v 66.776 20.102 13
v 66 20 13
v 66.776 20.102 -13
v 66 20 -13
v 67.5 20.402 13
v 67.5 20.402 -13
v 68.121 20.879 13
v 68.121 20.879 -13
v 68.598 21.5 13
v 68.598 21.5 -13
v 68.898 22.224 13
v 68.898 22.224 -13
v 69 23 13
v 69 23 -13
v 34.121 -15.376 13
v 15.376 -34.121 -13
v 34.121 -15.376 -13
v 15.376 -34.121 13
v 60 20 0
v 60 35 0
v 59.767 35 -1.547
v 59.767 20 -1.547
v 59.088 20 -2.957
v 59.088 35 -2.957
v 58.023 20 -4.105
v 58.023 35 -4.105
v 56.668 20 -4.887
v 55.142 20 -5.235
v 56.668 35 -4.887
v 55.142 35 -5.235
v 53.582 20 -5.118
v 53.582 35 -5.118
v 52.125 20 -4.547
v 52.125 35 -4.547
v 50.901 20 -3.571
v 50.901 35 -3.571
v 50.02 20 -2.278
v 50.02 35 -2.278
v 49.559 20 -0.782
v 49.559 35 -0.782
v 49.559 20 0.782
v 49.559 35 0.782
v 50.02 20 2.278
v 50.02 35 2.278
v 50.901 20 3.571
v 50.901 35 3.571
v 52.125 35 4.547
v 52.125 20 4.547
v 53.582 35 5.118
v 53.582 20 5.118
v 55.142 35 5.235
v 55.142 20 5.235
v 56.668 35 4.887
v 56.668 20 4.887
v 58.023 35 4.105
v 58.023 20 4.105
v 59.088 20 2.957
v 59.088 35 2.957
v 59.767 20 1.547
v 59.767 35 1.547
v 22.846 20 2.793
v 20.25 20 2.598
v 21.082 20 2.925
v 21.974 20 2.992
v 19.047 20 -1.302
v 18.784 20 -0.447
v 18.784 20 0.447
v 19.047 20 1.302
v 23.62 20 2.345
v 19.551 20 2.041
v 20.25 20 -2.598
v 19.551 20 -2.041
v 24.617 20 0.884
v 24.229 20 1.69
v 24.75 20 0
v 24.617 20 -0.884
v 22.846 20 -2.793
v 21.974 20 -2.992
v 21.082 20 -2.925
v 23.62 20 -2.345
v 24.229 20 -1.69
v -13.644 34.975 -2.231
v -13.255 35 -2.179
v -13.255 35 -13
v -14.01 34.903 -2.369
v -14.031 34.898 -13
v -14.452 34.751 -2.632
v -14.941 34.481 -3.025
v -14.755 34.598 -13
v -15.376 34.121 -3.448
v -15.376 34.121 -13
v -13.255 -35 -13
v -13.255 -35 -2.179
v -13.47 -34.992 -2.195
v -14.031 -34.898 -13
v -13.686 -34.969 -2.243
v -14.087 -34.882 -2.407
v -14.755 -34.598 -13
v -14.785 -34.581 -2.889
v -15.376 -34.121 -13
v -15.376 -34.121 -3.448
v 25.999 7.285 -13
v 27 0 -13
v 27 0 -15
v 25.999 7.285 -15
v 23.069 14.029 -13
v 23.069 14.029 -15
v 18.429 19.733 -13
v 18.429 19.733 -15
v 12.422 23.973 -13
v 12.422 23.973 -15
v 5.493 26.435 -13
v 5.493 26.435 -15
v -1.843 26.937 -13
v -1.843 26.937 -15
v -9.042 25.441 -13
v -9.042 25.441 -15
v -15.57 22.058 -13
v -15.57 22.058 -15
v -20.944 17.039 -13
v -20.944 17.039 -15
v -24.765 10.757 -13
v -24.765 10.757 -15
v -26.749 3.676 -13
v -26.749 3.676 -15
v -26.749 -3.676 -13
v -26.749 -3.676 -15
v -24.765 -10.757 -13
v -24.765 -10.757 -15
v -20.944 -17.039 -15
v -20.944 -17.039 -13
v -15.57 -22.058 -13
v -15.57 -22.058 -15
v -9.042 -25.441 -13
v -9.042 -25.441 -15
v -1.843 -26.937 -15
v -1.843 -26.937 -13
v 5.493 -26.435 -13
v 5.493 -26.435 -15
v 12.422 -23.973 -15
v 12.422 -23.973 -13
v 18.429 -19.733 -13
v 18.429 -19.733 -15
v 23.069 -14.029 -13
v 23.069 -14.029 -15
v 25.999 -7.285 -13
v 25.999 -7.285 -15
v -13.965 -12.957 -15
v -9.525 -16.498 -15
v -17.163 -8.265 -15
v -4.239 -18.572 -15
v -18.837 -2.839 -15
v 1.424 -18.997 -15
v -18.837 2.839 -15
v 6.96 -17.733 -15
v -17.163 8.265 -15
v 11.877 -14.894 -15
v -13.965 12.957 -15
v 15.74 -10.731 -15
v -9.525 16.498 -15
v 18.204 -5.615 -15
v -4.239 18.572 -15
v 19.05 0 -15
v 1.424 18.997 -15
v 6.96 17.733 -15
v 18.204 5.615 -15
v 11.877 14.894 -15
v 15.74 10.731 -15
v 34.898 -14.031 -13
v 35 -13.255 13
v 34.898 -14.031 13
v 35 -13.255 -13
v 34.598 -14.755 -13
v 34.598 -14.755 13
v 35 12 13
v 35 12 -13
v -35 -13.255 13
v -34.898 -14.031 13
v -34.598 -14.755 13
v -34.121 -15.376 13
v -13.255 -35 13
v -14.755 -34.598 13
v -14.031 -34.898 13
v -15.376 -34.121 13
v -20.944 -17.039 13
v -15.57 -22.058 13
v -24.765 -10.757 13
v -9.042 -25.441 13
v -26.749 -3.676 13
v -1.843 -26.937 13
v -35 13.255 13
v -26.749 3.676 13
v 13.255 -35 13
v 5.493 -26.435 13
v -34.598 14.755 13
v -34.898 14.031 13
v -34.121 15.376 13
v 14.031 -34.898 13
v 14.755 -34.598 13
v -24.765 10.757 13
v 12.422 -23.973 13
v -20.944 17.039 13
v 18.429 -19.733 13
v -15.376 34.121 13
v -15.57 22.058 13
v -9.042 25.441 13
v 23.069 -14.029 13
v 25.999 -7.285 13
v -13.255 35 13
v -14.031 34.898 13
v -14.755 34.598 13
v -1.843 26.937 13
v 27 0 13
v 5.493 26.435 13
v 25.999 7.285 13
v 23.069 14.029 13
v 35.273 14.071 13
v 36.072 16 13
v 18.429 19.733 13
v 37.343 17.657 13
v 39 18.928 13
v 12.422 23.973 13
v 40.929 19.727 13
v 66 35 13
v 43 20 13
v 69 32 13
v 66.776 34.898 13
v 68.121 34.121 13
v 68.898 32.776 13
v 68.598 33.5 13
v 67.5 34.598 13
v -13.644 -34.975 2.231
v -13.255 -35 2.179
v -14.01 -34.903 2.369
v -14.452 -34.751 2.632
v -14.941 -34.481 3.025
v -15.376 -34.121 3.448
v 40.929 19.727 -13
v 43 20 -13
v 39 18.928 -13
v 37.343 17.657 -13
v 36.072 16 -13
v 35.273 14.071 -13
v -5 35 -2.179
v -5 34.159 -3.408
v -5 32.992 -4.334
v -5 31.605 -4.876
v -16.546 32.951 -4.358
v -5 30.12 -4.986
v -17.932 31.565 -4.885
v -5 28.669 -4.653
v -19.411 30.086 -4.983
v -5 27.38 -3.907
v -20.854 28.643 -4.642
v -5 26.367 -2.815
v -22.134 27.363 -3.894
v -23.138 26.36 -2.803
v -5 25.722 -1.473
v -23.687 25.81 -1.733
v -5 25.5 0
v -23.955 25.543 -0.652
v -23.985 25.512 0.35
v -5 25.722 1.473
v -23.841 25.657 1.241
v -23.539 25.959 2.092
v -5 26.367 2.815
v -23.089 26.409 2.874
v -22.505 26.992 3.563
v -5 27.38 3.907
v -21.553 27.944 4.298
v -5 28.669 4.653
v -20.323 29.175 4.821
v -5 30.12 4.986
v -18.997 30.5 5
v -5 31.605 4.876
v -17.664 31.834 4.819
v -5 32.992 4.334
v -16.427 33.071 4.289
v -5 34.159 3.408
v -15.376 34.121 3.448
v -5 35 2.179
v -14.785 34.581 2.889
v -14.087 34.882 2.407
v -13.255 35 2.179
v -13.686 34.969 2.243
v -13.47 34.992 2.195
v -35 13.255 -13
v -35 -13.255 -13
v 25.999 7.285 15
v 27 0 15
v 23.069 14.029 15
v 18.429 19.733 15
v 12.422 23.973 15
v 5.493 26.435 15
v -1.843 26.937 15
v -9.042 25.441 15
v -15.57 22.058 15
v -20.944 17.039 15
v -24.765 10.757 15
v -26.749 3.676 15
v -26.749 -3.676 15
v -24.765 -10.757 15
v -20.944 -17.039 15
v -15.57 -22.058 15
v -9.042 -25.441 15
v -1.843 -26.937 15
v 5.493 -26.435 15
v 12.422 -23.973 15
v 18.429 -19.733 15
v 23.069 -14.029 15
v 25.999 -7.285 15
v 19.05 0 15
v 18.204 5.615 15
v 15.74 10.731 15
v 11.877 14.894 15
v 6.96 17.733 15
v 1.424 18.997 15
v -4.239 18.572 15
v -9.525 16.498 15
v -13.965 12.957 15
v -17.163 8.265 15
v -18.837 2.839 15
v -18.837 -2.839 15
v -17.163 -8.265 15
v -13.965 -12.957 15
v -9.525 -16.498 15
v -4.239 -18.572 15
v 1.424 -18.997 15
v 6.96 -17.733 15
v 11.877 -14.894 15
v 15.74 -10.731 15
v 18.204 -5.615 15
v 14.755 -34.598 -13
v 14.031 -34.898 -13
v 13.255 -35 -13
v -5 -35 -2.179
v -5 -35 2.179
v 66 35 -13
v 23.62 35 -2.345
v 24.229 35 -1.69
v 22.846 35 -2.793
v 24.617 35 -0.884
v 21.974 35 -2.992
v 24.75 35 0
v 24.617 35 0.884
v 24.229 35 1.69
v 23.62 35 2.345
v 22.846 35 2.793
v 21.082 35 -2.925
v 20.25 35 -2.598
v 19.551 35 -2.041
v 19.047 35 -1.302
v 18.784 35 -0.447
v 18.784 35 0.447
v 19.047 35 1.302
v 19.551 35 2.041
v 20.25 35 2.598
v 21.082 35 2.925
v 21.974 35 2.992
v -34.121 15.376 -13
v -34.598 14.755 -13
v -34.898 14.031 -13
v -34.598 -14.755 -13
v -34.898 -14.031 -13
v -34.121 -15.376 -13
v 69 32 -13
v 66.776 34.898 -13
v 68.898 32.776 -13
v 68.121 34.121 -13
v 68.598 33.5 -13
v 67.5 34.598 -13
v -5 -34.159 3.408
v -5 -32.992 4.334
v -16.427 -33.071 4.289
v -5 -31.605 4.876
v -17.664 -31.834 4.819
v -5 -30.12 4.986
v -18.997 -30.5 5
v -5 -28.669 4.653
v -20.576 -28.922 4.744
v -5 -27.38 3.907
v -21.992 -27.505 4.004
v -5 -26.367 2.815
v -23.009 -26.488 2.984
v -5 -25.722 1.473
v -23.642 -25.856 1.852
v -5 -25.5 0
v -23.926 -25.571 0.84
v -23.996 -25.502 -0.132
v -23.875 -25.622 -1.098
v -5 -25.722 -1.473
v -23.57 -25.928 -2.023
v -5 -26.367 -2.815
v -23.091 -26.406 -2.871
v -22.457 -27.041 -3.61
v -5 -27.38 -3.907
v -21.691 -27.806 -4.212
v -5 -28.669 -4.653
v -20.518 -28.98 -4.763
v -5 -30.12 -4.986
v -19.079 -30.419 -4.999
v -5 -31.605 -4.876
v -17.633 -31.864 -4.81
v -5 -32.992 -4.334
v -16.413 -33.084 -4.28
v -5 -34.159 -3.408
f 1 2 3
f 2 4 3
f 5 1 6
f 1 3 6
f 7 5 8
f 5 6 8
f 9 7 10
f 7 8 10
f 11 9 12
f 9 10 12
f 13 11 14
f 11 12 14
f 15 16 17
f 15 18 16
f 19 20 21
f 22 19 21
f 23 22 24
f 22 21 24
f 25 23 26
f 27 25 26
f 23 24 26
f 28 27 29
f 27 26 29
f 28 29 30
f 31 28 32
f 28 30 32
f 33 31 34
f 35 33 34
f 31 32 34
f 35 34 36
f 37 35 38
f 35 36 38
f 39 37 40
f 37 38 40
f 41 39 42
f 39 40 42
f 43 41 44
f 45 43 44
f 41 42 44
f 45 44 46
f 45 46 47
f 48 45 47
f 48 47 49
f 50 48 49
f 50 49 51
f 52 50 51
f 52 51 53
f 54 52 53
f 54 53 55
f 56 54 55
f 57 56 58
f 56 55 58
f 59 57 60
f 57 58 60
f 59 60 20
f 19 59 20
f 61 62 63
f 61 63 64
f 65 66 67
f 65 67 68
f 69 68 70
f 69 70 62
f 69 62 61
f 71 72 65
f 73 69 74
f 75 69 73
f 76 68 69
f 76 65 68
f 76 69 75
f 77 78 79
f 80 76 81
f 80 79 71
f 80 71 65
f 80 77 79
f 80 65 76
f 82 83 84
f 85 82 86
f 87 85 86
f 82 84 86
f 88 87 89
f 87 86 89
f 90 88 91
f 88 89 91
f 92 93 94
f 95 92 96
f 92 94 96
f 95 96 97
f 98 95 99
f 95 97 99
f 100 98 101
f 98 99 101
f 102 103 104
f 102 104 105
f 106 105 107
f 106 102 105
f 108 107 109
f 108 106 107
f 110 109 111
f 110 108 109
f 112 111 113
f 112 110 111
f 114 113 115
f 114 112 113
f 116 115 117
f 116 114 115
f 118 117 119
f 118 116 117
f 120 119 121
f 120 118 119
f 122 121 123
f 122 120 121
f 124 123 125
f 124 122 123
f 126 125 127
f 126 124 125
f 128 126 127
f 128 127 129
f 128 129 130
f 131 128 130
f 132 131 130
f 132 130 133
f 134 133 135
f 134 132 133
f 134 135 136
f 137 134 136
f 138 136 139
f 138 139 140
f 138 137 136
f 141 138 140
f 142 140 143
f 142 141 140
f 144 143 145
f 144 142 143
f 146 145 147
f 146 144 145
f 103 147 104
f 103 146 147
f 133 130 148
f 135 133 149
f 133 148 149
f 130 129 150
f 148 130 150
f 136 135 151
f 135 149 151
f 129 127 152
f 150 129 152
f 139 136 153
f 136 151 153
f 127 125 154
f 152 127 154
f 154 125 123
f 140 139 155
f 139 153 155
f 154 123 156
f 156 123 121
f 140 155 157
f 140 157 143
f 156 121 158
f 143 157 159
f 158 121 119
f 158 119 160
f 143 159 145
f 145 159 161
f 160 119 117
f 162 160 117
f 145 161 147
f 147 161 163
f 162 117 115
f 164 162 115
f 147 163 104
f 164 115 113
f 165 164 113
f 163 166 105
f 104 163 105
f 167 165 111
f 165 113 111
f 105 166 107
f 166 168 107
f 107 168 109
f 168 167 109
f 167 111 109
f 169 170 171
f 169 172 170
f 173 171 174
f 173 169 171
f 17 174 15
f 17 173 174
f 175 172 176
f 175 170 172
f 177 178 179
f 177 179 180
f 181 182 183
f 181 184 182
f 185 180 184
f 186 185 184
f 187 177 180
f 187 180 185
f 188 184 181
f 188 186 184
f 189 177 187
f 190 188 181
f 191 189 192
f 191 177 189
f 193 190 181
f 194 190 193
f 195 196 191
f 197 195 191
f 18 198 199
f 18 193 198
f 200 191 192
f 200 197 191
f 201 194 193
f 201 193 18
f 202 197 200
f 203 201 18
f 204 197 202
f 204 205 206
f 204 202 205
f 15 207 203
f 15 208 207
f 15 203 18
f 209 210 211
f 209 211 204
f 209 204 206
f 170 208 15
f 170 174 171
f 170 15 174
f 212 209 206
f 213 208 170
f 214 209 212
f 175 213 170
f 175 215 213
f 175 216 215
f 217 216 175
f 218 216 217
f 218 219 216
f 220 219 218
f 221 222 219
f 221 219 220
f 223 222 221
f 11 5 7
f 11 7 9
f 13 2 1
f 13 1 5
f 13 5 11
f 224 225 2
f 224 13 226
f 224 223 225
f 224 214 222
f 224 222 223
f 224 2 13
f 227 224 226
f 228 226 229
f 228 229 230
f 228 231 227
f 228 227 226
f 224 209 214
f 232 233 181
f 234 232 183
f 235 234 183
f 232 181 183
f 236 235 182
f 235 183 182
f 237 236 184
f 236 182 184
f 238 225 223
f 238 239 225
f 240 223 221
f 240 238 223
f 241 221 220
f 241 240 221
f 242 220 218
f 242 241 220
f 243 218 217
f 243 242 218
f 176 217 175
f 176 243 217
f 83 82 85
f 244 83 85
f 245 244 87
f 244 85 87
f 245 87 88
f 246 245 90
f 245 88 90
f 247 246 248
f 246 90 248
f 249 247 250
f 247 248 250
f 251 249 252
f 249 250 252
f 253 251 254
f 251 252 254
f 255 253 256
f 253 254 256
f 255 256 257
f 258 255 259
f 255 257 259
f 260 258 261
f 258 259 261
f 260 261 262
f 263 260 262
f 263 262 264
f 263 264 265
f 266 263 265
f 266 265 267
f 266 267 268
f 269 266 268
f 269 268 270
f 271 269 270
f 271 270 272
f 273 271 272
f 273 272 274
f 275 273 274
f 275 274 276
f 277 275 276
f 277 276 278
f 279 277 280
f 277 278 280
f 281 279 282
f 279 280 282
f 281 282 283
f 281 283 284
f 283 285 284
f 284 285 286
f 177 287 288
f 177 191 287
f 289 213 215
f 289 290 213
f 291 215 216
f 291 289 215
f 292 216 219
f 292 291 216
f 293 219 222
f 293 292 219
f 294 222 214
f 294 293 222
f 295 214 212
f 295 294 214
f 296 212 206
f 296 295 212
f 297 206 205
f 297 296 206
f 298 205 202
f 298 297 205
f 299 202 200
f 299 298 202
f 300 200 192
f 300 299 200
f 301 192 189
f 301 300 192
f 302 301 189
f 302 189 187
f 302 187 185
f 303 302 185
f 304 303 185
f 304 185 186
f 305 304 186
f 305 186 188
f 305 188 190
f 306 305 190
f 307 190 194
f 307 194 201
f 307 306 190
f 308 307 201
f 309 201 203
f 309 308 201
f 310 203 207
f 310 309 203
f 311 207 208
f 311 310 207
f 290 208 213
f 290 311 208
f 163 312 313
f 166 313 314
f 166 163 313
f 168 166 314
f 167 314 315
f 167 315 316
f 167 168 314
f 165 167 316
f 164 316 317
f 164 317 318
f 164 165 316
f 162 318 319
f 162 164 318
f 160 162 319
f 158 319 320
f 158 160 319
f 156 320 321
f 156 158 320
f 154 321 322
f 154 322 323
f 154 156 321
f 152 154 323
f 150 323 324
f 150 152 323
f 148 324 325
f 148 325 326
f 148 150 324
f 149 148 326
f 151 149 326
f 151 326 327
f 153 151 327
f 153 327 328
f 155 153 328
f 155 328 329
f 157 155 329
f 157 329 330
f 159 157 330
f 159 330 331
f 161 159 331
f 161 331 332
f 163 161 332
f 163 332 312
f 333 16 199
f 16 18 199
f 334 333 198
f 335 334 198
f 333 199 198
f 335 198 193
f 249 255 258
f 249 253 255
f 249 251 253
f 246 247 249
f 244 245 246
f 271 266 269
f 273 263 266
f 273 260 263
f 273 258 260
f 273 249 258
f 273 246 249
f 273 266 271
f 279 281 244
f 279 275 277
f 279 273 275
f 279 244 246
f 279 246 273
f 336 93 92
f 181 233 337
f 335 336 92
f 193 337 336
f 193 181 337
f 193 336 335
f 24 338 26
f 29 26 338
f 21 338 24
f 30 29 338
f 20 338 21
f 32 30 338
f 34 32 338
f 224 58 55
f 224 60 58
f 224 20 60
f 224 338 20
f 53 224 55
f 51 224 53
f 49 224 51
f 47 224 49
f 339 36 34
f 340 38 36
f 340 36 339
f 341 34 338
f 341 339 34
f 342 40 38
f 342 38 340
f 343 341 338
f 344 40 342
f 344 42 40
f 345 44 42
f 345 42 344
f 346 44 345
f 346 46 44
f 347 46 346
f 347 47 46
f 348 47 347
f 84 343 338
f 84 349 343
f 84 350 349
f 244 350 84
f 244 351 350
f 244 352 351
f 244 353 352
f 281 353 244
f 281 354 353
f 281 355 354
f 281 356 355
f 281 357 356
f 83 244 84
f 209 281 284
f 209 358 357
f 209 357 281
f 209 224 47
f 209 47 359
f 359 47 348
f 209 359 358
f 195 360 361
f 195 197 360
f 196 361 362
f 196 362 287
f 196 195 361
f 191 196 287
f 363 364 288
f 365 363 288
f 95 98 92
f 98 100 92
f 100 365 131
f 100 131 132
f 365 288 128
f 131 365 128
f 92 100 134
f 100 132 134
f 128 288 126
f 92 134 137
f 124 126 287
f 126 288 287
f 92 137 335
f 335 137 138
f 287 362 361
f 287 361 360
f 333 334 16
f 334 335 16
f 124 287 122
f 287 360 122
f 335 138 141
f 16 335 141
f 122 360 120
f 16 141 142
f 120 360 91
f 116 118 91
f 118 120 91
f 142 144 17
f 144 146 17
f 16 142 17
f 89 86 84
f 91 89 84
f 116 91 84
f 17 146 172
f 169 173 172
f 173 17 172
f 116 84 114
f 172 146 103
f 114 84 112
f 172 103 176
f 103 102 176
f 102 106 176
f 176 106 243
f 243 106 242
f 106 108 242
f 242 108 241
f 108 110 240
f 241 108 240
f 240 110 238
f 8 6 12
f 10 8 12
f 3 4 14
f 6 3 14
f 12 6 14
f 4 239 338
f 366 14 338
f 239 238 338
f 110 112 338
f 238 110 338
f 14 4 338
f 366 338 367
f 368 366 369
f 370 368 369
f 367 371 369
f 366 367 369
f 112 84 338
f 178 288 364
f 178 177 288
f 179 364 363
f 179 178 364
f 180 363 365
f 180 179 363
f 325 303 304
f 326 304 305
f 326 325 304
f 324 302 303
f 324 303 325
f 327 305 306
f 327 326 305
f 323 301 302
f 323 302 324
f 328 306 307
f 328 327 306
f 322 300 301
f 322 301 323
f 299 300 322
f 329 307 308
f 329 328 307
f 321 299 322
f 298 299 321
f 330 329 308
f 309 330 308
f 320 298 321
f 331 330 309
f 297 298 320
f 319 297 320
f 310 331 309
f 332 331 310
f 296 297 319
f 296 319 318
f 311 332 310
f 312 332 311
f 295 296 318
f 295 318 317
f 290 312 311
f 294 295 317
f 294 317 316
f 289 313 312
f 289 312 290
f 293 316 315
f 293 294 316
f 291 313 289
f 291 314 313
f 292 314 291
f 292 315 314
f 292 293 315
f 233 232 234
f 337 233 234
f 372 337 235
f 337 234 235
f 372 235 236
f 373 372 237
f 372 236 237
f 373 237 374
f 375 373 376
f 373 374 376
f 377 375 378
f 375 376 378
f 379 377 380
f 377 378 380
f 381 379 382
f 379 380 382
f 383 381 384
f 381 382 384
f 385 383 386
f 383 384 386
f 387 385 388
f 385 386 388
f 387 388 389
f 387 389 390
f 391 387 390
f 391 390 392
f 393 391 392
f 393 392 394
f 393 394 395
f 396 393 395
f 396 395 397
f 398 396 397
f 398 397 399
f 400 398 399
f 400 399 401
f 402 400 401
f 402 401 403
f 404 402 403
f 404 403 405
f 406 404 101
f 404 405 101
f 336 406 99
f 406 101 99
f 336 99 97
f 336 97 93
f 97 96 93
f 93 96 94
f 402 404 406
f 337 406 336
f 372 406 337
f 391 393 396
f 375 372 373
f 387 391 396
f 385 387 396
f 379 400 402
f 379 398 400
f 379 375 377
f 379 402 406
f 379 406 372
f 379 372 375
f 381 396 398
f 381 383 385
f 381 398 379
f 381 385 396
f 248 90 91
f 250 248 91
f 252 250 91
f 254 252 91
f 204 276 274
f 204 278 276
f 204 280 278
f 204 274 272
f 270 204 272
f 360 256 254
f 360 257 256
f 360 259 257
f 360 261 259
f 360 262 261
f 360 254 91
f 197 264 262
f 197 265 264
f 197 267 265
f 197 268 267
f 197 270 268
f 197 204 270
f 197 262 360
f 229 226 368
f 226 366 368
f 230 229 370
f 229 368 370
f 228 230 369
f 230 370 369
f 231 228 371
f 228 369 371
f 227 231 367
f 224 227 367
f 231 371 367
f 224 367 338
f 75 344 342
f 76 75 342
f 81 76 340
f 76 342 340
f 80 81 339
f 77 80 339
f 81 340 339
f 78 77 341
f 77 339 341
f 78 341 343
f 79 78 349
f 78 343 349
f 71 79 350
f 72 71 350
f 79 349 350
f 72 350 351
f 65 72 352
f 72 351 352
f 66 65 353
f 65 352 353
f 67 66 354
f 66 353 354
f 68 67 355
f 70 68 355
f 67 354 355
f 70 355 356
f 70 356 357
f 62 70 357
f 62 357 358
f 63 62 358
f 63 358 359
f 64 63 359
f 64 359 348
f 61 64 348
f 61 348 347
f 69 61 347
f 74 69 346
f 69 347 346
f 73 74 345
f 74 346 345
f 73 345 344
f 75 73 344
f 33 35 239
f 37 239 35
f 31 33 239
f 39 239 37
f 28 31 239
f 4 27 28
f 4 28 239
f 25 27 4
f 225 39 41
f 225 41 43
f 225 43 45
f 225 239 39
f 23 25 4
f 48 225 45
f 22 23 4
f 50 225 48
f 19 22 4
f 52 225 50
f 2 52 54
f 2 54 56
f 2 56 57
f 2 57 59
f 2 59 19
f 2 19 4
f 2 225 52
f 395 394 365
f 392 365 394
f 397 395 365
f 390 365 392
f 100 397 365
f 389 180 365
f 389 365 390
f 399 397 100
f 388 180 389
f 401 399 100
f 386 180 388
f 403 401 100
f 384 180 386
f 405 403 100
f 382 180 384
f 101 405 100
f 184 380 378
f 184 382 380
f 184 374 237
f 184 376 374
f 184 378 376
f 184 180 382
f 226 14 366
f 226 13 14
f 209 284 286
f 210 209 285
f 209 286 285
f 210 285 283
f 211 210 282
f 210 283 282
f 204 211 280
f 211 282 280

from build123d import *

# Parameters (mm, degrees)
SKETCH1_R           = 19.05
BOSS_EXTRUDE1_DEPTH = 13
FILLET1_R           = 8
FILLET2_R           = 3
SKETCH2_R           = 27
SKETCH2_R_2         = 19.05
BOSS_EXTRUDE2_DEPTH = 15
SKETCH3_R           = 5
CUT_EXTRUDE1_DEPTH  = 30
SKETCH4_R           = 5.25
SKETCH4_R_2         = 3
CUT_EXTRUDE2_DEPTH  = 15


with BuildPart() as part:
    # Sketch1 → Boss-Extrude1 (new body, symmetric)
    with BuildSketch(Plane.XY):
        Polygon((14.497474683, 35), (0, 35), (-14.497474683, 35), (-35, 14.497474683), (-35, -14.497474683), (-14.497474683, -35), (14.497474683, -35), (35, -14.497474683), (35, 20), (69, 20), (69, 35), align=None)
        Circle(SKETCH1_R, mode=Mode.SUBTRACT)
    extrude(amount=BOSS_EXTRUDE1_DEPTH, both=True)

    # Fillet1
    fillet1_edges = [part.edges().sort_by_distance(p)[0] for p in [
        (35, 20, 0),
    ]]
    fillet(fillet1_edges, radius=FILLET1_R)

    # Fillet2
    fillet2_edges = [part.edges().sort_by_distance(p)[0] for p in [
        (69, 35, 0),
        (69, 20, 0),
        (35, -14.497474683, 0),
        (14.497474683, -35, 0),
        (-14.497474683, -35, 0),
        (-35, -14.497474683, 0),
        (-35, 14.497474683, 0),
        (-14.497474683, 35, 0),
    ]]
    fillet(fillet2_edges, radius=FILLET2_R)

    # Sketch2 → Boss-Extrude2 (add, symmetric)
    with BuildSketch(Plane.XY):
        Circle(SKETCH2_R)
        Circle(SKETCH2_R_2, mode=Mode.SUBTRACT)
    extrude(amount=BOSS_EXTRUDE2_DEPTH, both=True)

    # Sketch3 → Cut-Extrude1 (cut)
    with BuildSketch(Plane.ZY.offset(35)):
        with Locations((0, -30.5)):
            Circle(SKETCH3_R)
        with Locations((0, 30.5)):
            Circle(SKETCH3_R)
    extrude(amount=-CUT_EXTRUDE1_DEPTH, mode=Mode.SUBTRACT)

    # Sketch4 → Cut-Extrude2 (cut)
    with BuildSketch(Plane(origin=(0, 35, 0), x_dir=(1, 0, 0), z_dir=(0, 1, 0))):
        with Locations((54.75, 0)):
            Circle(SKETCH4_R)
        with Locations((21.75, 0)):
            Circle(SKETCH4_R_2)
    extrude(amount=-CUT_EXTRUDE2_DEPTH, mode=Mode.SUBTRACT)


solid = part.part
